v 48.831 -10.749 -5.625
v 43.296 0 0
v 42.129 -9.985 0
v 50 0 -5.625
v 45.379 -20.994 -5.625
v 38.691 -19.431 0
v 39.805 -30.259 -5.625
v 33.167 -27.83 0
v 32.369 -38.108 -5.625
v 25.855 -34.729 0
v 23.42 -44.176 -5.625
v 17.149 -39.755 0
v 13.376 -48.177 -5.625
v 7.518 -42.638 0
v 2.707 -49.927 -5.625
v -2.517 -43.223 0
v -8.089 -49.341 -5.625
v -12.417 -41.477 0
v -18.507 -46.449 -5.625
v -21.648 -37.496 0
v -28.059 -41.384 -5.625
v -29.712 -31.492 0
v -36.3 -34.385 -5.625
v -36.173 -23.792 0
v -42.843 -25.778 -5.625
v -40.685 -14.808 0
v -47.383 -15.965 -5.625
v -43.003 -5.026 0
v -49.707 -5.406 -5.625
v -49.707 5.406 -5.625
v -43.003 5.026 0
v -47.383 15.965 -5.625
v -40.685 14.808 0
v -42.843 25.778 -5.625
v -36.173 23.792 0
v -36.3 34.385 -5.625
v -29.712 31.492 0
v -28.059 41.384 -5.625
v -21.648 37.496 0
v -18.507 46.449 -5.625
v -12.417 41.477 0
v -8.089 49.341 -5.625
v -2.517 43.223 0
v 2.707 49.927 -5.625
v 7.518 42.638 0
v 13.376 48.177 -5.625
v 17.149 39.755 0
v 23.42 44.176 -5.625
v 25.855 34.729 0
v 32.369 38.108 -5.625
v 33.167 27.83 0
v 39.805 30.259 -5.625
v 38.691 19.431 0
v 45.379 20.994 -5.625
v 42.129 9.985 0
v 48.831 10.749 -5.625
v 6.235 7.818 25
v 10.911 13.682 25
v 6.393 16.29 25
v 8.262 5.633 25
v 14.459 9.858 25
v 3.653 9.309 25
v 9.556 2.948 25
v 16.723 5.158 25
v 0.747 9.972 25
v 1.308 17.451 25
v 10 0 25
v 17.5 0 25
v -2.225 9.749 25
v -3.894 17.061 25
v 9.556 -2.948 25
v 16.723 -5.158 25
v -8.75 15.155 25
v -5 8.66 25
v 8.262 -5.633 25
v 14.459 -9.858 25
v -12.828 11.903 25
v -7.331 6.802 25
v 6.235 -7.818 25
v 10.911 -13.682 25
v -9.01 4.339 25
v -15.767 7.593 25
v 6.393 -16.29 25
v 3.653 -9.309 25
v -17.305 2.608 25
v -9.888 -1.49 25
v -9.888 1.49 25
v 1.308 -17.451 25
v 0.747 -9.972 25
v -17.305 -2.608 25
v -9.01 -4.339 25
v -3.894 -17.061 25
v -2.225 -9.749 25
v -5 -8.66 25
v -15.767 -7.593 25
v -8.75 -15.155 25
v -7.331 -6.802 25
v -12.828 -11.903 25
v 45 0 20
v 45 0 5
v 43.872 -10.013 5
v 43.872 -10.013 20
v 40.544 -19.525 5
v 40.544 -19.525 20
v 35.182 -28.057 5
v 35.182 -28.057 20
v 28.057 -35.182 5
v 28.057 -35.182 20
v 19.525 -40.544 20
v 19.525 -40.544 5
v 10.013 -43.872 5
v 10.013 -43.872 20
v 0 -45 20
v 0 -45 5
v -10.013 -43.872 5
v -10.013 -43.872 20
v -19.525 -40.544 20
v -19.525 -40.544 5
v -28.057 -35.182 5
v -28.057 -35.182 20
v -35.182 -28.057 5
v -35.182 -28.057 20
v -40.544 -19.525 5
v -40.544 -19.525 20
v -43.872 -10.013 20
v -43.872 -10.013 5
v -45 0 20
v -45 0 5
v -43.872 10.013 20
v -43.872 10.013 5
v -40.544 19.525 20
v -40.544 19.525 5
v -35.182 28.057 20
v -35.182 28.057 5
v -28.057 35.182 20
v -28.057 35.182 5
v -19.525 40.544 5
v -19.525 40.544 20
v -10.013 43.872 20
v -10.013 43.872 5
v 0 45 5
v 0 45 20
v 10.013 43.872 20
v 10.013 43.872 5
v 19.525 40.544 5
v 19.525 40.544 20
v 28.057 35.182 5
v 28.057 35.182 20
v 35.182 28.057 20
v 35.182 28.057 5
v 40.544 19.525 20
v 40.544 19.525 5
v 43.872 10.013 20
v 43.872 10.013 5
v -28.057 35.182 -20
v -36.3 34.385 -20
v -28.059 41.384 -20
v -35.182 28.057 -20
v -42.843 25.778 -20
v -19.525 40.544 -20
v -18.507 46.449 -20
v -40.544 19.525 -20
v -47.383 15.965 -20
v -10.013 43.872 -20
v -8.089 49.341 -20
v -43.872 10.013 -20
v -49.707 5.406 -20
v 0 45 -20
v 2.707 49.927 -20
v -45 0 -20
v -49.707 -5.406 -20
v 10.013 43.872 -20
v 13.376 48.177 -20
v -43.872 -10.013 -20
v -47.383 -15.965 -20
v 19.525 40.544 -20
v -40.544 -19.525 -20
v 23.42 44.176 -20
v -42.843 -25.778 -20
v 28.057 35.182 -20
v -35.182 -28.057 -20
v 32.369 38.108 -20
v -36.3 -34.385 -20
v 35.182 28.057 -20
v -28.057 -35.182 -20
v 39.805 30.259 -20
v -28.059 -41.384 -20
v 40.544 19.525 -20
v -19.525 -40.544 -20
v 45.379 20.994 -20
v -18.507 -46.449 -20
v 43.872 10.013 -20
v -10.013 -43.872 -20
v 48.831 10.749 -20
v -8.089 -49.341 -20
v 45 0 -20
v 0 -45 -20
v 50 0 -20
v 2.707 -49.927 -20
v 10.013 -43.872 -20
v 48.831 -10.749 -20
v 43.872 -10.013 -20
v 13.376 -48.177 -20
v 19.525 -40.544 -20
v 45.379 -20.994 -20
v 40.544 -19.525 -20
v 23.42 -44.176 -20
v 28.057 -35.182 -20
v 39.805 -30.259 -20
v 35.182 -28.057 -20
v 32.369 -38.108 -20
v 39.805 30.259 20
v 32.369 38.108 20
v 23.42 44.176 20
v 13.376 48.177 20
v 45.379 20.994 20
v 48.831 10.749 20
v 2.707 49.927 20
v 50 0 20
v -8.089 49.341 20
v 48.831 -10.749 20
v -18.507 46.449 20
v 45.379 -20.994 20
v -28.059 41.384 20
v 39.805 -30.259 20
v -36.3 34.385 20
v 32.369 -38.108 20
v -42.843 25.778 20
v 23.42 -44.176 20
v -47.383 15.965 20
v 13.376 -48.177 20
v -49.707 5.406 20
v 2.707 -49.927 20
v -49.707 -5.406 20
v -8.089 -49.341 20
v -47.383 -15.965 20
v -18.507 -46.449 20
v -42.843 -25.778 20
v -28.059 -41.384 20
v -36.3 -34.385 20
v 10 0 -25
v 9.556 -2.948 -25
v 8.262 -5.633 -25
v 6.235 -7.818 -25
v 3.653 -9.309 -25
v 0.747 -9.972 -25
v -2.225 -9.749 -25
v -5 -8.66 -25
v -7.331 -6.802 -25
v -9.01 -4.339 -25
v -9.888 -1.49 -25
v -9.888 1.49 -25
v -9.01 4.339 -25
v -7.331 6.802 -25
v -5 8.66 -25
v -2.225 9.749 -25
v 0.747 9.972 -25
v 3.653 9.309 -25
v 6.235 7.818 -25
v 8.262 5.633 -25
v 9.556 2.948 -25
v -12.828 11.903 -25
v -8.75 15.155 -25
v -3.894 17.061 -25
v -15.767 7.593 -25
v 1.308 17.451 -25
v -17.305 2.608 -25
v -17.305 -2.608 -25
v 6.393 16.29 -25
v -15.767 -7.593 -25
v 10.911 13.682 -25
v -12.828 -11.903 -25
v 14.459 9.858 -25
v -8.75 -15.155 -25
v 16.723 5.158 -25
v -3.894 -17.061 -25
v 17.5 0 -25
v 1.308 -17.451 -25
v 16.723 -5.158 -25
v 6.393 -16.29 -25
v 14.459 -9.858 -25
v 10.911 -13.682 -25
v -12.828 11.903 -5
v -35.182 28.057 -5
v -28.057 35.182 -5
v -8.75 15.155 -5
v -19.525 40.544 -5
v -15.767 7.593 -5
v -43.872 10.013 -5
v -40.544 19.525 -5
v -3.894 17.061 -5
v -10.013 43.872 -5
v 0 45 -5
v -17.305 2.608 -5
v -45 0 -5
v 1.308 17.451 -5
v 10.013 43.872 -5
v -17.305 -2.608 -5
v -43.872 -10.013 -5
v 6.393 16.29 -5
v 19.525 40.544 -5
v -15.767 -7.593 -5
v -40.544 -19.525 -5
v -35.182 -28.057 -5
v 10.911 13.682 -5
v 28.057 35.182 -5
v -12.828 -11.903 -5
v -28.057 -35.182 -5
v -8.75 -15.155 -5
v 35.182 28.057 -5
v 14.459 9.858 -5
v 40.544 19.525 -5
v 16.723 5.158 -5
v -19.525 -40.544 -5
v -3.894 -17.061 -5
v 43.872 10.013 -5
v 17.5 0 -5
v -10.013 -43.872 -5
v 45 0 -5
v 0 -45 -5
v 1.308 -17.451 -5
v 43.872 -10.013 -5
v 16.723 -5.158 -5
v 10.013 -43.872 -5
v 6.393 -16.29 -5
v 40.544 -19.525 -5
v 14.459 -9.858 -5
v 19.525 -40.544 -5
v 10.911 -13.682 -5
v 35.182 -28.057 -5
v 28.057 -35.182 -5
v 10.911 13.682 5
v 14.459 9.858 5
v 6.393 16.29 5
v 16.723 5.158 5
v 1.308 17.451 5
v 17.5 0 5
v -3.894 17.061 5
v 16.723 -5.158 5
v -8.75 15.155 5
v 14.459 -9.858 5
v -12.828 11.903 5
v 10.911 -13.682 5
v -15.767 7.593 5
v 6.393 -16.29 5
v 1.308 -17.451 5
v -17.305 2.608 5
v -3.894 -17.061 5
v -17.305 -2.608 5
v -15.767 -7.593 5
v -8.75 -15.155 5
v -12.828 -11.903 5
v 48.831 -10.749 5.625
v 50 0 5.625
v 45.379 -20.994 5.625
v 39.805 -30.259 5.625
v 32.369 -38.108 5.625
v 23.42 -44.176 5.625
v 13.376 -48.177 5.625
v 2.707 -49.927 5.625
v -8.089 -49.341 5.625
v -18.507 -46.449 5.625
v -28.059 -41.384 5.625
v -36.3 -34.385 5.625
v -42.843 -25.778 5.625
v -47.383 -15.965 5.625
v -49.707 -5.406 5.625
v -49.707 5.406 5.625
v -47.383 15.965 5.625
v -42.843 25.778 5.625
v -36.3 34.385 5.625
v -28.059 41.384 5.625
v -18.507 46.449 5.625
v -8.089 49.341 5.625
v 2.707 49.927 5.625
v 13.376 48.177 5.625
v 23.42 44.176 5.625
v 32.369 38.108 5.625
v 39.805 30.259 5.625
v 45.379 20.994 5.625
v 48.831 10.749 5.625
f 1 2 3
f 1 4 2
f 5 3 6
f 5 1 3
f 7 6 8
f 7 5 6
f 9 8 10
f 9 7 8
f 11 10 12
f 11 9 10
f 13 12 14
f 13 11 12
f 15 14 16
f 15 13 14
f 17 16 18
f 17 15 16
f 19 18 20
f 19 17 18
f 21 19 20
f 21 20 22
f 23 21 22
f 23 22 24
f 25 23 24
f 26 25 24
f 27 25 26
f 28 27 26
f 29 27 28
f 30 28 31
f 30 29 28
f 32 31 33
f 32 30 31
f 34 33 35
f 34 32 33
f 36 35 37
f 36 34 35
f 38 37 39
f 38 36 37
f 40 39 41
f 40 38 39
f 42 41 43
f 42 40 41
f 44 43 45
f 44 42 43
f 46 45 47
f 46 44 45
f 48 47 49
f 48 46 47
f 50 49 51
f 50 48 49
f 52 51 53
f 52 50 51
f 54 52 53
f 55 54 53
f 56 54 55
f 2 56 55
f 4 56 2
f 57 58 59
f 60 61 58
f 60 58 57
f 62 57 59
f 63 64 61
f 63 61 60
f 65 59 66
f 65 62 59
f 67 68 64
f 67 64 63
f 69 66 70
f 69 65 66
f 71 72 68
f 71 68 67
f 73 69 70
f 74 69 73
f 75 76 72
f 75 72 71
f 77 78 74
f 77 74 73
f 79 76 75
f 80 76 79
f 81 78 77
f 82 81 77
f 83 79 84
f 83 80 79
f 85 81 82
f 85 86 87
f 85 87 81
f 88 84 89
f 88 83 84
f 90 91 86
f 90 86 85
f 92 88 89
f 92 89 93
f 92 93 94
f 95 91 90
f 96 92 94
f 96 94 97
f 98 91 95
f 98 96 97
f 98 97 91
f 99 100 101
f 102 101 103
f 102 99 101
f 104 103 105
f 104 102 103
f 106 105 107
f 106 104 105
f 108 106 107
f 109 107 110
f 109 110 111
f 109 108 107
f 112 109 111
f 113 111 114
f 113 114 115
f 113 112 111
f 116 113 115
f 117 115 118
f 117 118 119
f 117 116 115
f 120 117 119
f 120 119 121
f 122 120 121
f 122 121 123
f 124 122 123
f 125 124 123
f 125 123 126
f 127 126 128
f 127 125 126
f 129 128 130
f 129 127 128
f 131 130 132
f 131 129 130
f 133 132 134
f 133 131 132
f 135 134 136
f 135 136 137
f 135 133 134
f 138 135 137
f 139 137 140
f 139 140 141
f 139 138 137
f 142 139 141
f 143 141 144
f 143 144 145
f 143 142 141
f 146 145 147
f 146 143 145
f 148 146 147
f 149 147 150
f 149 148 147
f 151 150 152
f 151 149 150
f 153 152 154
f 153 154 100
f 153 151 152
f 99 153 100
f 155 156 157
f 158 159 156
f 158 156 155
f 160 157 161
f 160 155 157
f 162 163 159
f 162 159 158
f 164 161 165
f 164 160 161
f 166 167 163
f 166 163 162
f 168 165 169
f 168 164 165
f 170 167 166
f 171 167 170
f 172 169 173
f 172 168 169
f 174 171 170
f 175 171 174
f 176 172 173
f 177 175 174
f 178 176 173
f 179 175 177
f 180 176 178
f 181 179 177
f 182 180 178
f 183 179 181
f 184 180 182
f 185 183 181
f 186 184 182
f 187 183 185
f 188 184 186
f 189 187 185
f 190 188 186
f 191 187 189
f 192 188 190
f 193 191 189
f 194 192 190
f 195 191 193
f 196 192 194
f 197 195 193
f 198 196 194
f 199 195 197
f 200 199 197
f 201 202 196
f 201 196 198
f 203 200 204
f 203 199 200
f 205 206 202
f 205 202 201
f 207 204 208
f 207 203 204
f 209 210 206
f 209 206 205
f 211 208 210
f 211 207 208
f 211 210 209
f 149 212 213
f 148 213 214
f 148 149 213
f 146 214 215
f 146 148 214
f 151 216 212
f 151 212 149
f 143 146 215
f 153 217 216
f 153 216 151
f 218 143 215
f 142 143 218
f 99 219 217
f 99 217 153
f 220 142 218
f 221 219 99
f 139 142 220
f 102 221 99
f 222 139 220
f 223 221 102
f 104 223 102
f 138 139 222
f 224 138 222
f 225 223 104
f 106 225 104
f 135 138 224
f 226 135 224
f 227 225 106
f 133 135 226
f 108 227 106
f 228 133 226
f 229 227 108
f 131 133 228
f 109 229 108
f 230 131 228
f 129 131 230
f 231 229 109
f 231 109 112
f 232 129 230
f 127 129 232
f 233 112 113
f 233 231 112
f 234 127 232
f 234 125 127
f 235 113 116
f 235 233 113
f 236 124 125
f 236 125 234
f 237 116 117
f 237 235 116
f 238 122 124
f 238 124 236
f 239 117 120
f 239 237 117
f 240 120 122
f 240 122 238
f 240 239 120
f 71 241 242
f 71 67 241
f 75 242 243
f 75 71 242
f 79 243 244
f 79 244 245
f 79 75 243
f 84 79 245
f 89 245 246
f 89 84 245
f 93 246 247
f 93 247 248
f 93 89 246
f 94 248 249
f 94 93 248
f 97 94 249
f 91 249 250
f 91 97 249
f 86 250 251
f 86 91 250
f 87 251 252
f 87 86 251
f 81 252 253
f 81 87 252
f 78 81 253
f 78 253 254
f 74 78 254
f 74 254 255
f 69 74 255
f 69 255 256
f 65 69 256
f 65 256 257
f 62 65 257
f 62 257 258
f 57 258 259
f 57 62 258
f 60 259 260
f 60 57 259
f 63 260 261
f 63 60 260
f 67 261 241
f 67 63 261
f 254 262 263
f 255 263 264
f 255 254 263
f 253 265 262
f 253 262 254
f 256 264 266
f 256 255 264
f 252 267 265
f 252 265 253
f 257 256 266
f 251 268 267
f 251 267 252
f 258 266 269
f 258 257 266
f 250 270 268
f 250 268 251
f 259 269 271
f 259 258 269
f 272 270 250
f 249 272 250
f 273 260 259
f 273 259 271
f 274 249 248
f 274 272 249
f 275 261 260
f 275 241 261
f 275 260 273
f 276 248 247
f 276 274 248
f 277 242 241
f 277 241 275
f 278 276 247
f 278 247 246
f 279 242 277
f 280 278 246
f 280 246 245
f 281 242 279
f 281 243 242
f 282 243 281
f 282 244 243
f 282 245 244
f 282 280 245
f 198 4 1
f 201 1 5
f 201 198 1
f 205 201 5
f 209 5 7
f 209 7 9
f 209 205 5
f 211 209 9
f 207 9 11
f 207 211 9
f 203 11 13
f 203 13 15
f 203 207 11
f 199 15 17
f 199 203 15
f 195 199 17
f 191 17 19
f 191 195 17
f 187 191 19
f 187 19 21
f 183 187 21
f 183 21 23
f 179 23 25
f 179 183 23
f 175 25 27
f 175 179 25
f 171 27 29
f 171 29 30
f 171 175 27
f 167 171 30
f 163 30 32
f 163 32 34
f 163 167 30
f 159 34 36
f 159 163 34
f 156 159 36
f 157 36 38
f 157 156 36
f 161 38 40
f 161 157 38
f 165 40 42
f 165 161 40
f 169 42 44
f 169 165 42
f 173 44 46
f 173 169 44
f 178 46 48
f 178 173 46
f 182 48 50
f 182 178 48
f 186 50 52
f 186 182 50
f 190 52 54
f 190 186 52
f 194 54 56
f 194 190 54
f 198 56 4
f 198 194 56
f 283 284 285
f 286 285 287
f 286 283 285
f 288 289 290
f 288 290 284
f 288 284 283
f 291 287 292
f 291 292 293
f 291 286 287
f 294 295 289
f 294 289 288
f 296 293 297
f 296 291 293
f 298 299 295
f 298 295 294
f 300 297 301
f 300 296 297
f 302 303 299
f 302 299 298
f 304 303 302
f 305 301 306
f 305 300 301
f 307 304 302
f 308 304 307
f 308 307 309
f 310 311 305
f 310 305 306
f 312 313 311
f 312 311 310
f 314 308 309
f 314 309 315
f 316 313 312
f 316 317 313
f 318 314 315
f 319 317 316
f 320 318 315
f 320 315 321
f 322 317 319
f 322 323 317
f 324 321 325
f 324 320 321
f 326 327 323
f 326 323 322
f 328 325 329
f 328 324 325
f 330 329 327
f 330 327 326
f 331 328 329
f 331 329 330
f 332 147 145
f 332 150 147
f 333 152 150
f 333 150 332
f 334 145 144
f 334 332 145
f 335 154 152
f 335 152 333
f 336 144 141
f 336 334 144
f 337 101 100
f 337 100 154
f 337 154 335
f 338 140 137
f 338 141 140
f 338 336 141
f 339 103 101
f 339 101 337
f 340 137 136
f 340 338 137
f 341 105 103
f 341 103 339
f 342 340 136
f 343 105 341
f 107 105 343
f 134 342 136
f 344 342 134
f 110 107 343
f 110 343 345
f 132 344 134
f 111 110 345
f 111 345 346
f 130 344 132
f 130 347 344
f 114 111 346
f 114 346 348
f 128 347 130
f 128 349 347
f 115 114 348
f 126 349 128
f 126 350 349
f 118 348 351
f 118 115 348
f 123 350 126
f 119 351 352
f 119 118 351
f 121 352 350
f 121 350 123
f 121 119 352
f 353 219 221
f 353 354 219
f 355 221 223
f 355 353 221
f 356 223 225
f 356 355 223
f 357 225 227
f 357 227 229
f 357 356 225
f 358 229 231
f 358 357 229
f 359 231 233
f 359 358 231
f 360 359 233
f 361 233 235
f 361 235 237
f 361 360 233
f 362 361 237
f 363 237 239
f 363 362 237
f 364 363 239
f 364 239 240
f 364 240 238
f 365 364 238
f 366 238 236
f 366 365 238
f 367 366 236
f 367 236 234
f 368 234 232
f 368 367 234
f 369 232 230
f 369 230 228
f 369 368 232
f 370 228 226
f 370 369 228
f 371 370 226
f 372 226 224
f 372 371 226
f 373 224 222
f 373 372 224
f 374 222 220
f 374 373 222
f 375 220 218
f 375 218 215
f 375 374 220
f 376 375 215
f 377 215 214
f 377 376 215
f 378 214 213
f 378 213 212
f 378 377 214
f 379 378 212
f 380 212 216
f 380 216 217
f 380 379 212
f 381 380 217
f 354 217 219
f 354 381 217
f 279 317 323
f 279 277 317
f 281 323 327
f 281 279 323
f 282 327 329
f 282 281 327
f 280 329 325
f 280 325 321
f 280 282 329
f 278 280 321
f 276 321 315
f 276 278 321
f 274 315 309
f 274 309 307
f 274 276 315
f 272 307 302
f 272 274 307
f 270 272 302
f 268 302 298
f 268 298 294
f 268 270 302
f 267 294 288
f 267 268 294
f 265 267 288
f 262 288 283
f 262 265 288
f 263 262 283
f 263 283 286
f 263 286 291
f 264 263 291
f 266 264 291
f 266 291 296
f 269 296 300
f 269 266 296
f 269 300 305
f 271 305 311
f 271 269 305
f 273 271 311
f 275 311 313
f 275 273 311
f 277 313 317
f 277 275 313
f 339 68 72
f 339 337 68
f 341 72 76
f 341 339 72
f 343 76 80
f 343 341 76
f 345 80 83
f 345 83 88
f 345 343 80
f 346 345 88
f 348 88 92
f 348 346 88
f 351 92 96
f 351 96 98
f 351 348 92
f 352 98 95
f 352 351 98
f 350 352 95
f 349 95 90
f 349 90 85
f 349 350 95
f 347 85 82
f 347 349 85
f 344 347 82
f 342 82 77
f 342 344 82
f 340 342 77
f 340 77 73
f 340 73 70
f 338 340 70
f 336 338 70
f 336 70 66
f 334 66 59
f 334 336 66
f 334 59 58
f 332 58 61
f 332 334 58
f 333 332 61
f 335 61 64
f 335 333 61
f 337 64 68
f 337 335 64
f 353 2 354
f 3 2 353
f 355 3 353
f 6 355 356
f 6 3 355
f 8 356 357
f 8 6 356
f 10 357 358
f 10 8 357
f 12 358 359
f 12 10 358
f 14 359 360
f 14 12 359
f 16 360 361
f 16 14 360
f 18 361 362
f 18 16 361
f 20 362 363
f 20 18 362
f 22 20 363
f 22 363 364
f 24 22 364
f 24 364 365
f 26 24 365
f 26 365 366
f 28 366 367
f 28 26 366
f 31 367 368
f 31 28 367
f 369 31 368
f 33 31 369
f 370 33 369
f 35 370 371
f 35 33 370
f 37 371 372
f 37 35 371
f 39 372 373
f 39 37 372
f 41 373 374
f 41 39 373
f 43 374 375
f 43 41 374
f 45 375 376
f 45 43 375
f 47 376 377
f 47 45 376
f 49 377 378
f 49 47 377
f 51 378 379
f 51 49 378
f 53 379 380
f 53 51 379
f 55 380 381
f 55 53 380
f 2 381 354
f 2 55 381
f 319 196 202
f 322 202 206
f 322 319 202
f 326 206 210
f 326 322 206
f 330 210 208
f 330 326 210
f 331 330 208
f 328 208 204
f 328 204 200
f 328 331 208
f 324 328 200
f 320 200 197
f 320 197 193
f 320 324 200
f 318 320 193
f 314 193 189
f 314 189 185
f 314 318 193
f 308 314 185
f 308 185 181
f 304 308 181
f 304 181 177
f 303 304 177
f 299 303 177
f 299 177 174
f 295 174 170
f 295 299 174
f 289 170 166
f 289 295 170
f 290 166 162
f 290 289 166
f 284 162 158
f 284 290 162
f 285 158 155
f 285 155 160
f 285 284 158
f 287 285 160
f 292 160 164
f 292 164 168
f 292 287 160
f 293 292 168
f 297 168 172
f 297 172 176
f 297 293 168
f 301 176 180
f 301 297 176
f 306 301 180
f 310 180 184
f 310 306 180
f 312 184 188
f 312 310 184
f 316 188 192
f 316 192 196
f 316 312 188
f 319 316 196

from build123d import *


with BuildPart() as part:
    # Croquis1 → Revolución1 (revolve)
    with BuildSketch(Plane(origin=(0, 0, 0), x_dir=(0, 0, -1), z_dir=(1, 0, 0)), mode=Mode.PRIVATE) as revoluci_n1_sk:
        Polygon((25, 10), (-25, 10), (-25, 17.5), (-5, 17.5), (-5, 45), (-20, 45), (-20, 50), (-5.625229638, 50), (0, 43.29611237), (5.625229638, 50), (20, 50), (20, 45), (5, 45), (5, 17.5), (25, 17.5), align=None)
    revolve(revoluci_n1_sk.sketch.rotate(Axis((0, 0, 0), (0, 0, -1)), 90), axis=Axis((0, 0, 0), (0, 0, -1)))


solid = part.part
